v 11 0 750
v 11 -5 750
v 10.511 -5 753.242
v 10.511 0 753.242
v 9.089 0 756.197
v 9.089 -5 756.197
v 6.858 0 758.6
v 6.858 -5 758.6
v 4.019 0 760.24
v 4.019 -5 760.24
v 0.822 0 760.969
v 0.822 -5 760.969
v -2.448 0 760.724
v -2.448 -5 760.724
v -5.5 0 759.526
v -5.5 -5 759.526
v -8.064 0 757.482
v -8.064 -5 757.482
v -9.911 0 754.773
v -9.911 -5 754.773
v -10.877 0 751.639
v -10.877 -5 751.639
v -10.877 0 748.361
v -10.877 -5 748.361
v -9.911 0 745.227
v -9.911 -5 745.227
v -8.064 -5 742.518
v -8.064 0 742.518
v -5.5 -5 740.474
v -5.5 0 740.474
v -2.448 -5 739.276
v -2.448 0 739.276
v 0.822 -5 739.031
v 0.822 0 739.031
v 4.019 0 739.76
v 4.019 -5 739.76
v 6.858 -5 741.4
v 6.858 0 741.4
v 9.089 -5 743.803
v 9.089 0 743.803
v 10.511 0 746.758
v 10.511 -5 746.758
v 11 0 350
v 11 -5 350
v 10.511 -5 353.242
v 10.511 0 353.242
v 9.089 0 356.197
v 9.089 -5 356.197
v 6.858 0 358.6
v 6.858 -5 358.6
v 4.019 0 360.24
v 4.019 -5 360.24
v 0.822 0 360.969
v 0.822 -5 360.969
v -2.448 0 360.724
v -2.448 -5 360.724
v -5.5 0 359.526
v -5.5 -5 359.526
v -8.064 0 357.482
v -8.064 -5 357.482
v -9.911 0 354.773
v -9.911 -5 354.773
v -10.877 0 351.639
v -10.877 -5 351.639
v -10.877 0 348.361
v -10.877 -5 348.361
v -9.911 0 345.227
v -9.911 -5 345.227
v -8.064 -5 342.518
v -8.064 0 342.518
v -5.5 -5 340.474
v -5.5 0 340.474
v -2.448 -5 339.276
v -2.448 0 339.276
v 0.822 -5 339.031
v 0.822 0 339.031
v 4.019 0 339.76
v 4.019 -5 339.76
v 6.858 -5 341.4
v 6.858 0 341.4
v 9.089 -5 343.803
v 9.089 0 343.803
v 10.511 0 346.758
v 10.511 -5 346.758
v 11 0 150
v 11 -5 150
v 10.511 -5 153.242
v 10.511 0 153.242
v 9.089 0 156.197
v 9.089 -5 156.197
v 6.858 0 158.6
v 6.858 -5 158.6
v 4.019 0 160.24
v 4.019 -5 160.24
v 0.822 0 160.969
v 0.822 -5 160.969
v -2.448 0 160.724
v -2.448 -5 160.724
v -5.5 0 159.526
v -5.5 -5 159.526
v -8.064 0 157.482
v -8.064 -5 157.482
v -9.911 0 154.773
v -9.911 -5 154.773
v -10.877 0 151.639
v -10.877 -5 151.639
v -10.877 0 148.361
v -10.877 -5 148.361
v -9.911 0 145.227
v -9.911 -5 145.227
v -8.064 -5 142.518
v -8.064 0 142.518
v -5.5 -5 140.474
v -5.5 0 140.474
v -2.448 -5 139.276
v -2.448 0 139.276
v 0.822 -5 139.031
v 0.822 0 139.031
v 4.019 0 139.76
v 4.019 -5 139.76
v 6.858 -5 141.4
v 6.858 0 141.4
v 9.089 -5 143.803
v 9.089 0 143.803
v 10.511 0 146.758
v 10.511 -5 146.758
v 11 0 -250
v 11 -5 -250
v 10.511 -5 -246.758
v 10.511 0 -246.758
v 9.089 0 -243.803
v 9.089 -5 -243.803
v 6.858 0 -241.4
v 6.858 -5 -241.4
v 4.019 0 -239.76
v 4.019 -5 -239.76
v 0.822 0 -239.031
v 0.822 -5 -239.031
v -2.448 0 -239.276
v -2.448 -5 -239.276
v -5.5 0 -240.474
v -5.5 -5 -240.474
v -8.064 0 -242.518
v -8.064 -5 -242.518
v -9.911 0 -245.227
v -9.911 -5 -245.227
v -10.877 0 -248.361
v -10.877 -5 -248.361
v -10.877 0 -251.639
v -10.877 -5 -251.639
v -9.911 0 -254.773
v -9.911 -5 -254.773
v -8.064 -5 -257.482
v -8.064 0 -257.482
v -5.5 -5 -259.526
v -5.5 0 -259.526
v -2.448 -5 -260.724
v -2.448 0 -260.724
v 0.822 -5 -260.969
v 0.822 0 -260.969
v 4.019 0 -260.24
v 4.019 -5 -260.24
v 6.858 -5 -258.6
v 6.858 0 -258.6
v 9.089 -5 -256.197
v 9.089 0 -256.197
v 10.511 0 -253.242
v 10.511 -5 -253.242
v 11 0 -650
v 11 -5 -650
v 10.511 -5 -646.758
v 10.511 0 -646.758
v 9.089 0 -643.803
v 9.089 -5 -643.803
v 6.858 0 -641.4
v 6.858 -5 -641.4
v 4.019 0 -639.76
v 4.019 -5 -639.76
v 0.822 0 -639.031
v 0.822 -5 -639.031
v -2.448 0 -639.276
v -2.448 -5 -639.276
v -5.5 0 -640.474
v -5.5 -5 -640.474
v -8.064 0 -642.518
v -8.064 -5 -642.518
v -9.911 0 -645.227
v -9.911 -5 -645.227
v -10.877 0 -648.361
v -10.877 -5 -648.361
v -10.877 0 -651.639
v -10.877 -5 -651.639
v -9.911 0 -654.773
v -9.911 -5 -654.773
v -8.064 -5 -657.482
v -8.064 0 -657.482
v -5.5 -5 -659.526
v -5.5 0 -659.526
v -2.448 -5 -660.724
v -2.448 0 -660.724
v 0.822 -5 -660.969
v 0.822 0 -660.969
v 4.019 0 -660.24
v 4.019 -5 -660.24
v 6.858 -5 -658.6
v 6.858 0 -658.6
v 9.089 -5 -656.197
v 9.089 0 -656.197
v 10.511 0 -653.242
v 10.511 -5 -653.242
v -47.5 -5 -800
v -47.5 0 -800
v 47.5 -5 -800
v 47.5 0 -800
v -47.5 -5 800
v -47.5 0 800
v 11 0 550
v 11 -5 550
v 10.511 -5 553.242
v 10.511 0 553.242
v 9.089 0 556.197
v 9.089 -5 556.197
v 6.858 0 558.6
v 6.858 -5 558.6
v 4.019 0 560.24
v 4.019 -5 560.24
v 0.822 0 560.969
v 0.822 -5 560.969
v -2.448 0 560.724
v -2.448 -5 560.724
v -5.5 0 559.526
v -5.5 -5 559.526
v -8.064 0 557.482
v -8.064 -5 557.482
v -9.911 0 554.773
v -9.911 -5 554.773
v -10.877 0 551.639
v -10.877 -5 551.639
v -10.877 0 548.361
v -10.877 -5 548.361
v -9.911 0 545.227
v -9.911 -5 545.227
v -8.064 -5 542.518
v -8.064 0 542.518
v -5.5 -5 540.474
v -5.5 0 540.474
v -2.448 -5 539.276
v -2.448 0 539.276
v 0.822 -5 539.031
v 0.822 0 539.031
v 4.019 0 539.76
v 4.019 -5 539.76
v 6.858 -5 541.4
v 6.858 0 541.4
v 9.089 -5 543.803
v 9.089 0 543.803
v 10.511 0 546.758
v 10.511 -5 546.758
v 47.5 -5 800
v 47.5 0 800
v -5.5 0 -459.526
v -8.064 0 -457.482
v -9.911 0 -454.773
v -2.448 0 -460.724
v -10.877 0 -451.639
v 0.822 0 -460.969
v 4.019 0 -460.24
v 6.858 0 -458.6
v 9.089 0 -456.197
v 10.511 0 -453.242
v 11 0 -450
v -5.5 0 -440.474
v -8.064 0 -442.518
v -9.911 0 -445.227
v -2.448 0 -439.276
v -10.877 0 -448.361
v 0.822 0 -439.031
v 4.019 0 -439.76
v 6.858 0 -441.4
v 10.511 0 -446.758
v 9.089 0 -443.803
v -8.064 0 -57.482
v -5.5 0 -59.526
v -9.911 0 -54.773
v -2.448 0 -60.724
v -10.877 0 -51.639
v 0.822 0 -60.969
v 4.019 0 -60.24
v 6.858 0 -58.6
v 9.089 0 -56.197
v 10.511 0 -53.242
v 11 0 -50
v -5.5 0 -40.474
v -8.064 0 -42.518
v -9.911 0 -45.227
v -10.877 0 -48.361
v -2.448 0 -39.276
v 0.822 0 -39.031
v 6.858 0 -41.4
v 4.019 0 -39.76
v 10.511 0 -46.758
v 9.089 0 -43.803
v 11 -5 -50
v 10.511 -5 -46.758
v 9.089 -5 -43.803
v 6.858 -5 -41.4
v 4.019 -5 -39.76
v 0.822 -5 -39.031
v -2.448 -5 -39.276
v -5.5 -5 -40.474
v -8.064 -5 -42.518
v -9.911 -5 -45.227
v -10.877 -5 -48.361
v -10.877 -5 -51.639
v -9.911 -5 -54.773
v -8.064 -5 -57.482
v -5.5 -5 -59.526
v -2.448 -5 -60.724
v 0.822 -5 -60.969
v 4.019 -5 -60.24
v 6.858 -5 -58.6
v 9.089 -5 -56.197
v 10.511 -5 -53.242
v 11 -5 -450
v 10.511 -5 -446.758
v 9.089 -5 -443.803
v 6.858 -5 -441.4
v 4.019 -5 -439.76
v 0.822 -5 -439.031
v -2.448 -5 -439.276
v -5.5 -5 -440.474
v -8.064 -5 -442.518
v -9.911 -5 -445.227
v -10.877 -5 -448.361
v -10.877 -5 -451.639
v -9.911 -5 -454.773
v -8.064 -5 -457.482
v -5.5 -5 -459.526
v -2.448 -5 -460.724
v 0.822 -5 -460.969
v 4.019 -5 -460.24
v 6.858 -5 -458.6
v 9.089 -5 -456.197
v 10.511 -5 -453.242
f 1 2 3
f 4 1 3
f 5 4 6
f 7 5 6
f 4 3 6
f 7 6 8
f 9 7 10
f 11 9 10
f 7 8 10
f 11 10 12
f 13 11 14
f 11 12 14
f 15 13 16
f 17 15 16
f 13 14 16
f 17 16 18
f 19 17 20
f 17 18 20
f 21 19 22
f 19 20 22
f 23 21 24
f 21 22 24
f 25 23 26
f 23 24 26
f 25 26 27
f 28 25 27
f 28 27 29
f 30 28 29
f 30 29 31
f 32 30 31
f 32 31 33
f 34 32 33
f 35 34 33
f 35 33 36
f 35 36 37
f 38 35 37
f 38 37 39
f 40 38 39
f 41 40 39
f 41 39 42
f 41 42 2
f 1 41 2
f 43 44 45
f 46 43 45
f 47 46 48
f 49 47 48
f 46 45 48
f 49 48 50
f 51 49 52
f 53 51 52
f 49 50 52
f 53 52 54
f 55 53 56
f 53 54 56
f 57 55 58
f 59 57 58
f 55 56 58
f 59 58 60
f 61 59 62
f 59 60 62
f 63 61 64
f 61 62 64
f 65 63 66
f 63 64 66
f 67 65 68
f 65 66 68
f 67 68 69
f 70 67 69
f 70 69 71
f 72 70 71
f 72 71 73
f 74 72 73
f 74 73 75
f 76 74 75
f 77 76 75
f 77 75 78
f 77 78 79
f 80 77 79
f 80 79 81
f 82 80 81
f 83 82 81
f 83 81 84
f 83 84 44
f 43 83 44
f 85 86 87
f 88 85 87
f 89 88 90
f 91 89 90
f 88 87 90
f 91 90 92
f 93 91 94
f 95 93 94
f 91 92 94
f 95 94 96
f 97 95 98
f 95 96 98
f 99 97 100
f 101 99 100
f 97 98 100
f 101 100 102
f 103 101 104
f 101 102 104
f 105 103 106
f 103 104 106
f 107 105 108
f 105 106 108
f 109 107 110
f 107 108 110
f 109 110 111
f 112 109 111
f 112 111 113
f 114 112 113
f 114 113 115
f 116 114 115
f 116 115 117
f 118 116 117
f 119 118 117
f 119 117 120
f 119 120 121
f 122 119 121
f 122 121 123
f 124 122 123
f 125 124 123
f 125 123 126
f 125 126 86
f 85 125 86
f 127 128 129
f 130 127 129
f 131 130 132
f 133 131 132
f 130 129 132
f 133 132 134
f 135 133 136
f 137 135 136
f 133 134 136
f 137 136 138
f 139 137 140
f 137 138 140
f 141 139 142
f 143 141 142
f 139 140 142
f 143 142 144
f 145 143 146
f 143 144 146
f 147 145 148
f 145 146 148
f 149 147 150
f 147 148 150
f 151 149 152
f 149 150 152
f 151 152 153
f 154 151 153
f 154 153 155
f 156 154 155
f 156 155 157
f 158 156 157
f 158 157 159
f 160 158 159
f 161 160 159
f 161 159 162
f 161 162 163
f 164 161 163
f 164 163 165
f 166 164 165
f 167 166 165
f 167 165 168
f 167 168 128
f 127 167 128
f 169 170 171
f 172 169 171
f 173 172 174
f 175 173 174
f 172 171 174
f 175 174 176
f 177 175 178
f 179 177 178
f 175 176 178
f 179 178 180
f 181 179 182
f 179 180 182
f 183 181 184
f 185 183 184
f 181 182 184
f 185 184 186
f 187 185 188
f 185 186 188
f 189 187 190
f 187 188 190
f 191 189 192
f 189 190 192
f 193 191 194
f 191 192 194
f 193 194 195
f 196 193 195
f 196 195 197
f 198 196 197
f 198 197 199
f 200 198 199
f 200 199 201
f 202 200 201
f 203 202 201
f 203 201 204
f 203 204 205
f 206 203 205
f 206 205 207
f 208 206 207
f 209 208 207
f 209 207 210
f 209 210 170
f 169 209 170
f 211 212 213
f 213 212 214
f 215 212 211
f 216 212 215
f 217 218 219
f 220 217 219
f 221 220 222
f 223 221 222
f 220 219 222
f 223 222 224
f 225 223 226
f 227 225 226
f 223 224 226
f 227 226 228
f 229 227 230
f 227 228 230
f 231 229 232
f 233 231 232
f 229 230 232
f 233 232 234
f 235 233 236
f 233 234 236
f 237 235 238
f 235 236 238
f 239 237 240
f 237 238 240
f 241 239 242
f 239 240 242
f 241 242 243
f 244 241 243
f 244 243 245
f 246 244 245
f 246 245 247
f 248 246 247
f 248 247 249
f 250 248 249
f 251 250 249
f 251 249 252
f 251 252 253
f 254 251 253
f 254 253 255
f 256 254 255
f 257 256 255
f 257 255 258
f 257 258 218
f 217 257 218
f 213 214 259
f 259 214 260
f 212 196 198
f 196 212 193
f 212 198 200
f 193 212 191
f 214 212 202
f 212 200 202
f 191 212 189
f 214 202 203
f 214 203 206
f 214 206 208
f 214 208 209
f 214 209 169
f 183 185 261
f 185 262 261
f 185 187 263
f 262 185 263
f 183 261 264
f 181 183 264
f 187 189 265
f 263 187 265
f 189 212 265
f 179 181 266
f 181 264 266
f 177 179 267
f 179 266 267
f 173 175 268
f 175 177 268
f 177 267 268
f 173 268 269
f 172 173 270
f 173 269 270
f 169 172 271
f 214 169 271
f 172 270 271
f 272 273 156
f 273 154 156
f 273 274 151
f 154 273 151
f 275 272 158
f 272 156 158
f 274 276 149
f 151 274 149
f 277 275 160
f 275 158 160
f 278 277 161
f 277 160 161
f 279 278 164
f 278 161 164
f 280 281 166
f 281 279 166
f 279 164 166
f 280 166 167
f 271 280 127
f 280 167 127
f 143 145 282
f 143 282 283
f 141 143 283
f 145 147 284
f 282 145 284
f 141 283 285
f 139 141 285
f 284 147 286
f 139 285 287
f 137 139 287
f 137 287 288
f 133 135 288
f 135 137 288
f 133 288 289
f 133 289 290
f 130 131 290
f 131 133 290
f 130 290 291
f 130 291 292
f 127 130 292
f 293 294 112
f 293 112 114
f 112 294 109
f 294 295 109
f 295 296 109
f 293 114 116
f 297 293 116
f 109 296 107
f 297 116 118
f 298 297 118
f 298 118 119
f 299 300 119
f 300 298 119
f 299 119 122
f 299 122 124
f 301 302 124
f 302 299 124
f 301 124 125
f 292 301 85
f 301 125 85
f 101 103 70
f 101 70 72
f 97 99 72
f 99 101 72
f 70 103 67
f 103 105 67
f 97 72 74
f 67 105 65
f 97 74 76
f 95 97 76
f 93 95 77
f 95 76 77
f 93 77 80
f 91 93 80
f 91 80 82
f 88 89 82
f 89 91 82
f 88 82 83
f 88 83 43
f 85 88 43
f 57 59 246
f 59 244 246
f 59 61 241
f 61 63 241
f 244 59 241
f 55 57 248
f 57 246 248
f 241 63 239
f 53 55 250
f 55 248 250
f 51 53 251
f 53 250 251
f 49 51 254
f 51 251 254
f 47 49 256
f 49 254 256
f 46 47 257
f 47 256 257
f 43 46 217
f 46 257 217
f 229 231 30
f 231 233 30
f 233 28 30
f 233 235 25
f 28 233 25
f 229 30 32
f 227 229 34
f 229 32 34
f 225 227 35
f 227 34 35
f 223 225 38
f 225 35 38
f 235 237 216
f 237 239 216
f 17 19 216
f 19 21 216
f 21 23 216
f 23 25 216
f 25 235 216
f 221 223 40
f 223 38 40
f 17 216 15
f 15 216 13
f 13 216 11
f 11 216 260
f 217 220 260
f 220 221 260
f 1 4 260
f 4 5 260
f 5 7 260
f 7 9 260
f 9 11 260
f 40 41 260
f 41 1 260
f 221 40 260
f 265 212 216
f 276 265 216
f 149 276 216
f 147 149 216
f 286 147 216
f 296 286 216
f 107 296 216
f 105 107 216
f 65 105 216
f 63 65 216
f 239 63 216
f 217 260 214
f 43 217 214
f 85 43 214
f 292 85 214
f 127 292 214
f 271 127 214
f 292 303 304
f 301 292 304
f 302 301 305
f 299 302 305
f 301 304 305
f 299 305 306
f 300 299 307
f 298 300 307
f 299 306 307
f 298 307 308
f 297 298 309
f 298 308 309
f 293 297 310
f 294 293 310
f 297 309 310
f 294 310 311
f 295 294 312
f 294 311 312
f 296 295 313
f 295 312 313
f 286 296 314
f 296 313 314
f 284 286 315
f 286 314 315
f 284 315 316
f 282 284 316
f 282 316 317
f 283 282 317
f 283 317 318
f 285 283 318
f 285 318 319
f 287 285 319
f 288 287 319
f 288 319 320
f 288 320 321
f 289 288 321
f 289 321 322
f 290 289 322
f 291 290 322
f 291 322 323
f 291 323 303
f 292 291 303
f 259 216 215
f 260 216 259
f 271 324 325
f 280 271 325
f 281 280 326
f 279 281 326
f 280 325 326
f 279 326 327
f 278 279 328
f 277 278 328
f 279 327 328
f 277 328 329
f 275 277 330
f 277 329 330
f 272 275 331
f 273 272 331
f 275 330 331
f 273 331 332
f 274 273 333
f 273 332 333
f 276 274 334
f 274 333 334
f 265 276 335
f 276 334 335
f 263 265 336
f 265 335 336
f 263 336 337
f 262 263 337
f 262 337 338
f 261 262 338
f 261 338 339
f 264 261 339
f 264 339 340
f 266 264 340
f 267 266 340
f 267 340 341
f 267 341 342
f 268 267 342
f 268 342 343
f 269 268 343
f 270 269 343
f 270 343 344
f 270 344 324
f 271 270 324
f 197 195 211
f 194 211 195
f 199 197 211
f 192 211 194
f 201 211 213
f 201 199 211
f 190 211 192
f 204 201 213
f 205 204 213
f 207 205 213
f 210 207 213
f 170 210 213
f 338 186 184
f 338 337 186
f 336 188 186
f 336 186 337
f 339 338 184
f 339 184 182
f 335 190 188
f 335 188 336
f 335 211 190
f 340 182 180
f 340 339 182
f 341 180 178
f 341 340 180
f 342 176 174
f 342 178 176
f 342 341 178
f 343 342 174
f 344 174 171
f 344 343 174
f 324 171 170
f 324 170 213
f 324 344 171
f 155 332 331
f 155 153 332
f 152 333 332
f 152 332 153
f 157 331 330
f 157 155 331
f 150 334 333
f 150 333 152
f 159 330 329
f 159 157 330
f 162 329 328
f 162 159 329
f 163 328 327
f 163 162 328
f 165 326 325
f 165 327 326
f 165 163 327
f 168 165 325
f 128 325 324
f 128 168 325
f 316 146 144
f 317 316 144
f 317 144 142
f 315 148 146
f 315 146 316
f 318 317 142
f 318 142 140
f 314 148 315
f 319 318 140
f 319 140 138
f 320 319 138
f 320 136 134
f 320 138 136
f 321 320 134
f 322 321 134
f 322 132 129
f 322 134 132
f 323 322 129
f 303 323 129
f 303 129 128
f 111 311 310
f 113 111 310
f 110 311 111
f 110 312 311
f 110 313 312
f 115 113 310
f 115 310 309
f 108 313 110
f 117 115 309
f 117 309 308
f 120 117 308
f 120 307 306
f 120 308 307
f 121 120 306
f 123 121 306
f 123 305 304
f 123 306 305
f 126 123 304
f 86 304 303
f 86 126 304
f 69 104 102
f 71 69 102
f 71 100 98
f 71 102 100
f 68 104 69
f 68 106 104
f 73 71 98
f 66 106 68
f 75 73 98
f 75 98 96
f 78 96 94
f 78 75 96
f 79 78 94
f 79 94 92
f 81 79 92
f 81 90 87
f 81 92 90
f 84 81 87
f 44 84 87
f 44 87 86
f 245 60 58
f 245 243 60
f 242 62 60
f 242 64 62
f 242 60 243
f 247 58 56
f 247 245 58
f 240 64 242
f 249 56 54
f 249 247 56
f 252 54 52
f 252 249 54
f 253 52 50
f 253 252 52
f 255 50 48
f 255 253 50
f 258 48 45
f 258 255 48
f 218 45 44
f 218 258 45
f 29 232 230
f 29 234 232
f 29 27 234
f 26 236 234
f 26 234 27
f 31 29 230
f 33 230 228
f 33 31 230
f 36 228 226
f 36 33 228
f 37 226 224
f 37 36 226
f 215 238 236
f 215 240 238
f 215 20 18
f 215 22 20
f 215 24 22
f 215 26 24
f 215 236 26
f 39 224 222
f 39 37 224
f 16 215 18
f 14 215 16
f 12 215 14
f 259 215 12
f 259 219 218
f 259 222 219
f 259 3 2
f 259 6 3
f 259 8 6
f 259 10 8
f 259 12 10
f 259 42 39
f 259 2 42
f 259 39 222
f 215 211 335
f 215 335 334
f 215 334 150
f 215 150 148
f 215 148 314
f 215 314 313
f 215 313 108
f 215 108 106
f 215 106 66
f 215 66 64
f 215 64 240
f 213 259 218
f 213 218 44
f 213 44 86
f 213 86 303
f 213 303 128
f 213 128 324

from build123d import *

# Parameters (mm, degrees)
F0_W     = 95
F0_H     = 1600
F1_DEPTH = 5
F2_R     = 11
F3_DEPTH = 25


with BuildPart() as f1:
    # F0 (on Front) → F1 (new body)
    with BuildSketch(Plane.XZ):
        Rectangle(F0_W, F0_H)
    extrude(amount=F1_DEPTH)

    # F2 (on face) → F3 (cut)
    with BuildSketch(Plane.XZ.offset(5)):
        with Locations((0, -250)):
            Circle(F2_R)
        with Locations((0, -50)):
            Circle(F2_R)
        with Locations((0, 150)):
            Circle(F2_R)
        with Locations((0, 350)):
            Circle(F2_R)
        with Locations((0, 550)):
            Circle(F2_R)
        with Locations((0, 750)):
            Circle(F2_R)
        with Locations((0, -450)):
            Circle(F2_R)
        with Locations((0, -650)):
            Circle(F2_R)
    extrude(amount=-F3_DEPTH, mode=Mode.SUBTRACT)


solid = f1.part
